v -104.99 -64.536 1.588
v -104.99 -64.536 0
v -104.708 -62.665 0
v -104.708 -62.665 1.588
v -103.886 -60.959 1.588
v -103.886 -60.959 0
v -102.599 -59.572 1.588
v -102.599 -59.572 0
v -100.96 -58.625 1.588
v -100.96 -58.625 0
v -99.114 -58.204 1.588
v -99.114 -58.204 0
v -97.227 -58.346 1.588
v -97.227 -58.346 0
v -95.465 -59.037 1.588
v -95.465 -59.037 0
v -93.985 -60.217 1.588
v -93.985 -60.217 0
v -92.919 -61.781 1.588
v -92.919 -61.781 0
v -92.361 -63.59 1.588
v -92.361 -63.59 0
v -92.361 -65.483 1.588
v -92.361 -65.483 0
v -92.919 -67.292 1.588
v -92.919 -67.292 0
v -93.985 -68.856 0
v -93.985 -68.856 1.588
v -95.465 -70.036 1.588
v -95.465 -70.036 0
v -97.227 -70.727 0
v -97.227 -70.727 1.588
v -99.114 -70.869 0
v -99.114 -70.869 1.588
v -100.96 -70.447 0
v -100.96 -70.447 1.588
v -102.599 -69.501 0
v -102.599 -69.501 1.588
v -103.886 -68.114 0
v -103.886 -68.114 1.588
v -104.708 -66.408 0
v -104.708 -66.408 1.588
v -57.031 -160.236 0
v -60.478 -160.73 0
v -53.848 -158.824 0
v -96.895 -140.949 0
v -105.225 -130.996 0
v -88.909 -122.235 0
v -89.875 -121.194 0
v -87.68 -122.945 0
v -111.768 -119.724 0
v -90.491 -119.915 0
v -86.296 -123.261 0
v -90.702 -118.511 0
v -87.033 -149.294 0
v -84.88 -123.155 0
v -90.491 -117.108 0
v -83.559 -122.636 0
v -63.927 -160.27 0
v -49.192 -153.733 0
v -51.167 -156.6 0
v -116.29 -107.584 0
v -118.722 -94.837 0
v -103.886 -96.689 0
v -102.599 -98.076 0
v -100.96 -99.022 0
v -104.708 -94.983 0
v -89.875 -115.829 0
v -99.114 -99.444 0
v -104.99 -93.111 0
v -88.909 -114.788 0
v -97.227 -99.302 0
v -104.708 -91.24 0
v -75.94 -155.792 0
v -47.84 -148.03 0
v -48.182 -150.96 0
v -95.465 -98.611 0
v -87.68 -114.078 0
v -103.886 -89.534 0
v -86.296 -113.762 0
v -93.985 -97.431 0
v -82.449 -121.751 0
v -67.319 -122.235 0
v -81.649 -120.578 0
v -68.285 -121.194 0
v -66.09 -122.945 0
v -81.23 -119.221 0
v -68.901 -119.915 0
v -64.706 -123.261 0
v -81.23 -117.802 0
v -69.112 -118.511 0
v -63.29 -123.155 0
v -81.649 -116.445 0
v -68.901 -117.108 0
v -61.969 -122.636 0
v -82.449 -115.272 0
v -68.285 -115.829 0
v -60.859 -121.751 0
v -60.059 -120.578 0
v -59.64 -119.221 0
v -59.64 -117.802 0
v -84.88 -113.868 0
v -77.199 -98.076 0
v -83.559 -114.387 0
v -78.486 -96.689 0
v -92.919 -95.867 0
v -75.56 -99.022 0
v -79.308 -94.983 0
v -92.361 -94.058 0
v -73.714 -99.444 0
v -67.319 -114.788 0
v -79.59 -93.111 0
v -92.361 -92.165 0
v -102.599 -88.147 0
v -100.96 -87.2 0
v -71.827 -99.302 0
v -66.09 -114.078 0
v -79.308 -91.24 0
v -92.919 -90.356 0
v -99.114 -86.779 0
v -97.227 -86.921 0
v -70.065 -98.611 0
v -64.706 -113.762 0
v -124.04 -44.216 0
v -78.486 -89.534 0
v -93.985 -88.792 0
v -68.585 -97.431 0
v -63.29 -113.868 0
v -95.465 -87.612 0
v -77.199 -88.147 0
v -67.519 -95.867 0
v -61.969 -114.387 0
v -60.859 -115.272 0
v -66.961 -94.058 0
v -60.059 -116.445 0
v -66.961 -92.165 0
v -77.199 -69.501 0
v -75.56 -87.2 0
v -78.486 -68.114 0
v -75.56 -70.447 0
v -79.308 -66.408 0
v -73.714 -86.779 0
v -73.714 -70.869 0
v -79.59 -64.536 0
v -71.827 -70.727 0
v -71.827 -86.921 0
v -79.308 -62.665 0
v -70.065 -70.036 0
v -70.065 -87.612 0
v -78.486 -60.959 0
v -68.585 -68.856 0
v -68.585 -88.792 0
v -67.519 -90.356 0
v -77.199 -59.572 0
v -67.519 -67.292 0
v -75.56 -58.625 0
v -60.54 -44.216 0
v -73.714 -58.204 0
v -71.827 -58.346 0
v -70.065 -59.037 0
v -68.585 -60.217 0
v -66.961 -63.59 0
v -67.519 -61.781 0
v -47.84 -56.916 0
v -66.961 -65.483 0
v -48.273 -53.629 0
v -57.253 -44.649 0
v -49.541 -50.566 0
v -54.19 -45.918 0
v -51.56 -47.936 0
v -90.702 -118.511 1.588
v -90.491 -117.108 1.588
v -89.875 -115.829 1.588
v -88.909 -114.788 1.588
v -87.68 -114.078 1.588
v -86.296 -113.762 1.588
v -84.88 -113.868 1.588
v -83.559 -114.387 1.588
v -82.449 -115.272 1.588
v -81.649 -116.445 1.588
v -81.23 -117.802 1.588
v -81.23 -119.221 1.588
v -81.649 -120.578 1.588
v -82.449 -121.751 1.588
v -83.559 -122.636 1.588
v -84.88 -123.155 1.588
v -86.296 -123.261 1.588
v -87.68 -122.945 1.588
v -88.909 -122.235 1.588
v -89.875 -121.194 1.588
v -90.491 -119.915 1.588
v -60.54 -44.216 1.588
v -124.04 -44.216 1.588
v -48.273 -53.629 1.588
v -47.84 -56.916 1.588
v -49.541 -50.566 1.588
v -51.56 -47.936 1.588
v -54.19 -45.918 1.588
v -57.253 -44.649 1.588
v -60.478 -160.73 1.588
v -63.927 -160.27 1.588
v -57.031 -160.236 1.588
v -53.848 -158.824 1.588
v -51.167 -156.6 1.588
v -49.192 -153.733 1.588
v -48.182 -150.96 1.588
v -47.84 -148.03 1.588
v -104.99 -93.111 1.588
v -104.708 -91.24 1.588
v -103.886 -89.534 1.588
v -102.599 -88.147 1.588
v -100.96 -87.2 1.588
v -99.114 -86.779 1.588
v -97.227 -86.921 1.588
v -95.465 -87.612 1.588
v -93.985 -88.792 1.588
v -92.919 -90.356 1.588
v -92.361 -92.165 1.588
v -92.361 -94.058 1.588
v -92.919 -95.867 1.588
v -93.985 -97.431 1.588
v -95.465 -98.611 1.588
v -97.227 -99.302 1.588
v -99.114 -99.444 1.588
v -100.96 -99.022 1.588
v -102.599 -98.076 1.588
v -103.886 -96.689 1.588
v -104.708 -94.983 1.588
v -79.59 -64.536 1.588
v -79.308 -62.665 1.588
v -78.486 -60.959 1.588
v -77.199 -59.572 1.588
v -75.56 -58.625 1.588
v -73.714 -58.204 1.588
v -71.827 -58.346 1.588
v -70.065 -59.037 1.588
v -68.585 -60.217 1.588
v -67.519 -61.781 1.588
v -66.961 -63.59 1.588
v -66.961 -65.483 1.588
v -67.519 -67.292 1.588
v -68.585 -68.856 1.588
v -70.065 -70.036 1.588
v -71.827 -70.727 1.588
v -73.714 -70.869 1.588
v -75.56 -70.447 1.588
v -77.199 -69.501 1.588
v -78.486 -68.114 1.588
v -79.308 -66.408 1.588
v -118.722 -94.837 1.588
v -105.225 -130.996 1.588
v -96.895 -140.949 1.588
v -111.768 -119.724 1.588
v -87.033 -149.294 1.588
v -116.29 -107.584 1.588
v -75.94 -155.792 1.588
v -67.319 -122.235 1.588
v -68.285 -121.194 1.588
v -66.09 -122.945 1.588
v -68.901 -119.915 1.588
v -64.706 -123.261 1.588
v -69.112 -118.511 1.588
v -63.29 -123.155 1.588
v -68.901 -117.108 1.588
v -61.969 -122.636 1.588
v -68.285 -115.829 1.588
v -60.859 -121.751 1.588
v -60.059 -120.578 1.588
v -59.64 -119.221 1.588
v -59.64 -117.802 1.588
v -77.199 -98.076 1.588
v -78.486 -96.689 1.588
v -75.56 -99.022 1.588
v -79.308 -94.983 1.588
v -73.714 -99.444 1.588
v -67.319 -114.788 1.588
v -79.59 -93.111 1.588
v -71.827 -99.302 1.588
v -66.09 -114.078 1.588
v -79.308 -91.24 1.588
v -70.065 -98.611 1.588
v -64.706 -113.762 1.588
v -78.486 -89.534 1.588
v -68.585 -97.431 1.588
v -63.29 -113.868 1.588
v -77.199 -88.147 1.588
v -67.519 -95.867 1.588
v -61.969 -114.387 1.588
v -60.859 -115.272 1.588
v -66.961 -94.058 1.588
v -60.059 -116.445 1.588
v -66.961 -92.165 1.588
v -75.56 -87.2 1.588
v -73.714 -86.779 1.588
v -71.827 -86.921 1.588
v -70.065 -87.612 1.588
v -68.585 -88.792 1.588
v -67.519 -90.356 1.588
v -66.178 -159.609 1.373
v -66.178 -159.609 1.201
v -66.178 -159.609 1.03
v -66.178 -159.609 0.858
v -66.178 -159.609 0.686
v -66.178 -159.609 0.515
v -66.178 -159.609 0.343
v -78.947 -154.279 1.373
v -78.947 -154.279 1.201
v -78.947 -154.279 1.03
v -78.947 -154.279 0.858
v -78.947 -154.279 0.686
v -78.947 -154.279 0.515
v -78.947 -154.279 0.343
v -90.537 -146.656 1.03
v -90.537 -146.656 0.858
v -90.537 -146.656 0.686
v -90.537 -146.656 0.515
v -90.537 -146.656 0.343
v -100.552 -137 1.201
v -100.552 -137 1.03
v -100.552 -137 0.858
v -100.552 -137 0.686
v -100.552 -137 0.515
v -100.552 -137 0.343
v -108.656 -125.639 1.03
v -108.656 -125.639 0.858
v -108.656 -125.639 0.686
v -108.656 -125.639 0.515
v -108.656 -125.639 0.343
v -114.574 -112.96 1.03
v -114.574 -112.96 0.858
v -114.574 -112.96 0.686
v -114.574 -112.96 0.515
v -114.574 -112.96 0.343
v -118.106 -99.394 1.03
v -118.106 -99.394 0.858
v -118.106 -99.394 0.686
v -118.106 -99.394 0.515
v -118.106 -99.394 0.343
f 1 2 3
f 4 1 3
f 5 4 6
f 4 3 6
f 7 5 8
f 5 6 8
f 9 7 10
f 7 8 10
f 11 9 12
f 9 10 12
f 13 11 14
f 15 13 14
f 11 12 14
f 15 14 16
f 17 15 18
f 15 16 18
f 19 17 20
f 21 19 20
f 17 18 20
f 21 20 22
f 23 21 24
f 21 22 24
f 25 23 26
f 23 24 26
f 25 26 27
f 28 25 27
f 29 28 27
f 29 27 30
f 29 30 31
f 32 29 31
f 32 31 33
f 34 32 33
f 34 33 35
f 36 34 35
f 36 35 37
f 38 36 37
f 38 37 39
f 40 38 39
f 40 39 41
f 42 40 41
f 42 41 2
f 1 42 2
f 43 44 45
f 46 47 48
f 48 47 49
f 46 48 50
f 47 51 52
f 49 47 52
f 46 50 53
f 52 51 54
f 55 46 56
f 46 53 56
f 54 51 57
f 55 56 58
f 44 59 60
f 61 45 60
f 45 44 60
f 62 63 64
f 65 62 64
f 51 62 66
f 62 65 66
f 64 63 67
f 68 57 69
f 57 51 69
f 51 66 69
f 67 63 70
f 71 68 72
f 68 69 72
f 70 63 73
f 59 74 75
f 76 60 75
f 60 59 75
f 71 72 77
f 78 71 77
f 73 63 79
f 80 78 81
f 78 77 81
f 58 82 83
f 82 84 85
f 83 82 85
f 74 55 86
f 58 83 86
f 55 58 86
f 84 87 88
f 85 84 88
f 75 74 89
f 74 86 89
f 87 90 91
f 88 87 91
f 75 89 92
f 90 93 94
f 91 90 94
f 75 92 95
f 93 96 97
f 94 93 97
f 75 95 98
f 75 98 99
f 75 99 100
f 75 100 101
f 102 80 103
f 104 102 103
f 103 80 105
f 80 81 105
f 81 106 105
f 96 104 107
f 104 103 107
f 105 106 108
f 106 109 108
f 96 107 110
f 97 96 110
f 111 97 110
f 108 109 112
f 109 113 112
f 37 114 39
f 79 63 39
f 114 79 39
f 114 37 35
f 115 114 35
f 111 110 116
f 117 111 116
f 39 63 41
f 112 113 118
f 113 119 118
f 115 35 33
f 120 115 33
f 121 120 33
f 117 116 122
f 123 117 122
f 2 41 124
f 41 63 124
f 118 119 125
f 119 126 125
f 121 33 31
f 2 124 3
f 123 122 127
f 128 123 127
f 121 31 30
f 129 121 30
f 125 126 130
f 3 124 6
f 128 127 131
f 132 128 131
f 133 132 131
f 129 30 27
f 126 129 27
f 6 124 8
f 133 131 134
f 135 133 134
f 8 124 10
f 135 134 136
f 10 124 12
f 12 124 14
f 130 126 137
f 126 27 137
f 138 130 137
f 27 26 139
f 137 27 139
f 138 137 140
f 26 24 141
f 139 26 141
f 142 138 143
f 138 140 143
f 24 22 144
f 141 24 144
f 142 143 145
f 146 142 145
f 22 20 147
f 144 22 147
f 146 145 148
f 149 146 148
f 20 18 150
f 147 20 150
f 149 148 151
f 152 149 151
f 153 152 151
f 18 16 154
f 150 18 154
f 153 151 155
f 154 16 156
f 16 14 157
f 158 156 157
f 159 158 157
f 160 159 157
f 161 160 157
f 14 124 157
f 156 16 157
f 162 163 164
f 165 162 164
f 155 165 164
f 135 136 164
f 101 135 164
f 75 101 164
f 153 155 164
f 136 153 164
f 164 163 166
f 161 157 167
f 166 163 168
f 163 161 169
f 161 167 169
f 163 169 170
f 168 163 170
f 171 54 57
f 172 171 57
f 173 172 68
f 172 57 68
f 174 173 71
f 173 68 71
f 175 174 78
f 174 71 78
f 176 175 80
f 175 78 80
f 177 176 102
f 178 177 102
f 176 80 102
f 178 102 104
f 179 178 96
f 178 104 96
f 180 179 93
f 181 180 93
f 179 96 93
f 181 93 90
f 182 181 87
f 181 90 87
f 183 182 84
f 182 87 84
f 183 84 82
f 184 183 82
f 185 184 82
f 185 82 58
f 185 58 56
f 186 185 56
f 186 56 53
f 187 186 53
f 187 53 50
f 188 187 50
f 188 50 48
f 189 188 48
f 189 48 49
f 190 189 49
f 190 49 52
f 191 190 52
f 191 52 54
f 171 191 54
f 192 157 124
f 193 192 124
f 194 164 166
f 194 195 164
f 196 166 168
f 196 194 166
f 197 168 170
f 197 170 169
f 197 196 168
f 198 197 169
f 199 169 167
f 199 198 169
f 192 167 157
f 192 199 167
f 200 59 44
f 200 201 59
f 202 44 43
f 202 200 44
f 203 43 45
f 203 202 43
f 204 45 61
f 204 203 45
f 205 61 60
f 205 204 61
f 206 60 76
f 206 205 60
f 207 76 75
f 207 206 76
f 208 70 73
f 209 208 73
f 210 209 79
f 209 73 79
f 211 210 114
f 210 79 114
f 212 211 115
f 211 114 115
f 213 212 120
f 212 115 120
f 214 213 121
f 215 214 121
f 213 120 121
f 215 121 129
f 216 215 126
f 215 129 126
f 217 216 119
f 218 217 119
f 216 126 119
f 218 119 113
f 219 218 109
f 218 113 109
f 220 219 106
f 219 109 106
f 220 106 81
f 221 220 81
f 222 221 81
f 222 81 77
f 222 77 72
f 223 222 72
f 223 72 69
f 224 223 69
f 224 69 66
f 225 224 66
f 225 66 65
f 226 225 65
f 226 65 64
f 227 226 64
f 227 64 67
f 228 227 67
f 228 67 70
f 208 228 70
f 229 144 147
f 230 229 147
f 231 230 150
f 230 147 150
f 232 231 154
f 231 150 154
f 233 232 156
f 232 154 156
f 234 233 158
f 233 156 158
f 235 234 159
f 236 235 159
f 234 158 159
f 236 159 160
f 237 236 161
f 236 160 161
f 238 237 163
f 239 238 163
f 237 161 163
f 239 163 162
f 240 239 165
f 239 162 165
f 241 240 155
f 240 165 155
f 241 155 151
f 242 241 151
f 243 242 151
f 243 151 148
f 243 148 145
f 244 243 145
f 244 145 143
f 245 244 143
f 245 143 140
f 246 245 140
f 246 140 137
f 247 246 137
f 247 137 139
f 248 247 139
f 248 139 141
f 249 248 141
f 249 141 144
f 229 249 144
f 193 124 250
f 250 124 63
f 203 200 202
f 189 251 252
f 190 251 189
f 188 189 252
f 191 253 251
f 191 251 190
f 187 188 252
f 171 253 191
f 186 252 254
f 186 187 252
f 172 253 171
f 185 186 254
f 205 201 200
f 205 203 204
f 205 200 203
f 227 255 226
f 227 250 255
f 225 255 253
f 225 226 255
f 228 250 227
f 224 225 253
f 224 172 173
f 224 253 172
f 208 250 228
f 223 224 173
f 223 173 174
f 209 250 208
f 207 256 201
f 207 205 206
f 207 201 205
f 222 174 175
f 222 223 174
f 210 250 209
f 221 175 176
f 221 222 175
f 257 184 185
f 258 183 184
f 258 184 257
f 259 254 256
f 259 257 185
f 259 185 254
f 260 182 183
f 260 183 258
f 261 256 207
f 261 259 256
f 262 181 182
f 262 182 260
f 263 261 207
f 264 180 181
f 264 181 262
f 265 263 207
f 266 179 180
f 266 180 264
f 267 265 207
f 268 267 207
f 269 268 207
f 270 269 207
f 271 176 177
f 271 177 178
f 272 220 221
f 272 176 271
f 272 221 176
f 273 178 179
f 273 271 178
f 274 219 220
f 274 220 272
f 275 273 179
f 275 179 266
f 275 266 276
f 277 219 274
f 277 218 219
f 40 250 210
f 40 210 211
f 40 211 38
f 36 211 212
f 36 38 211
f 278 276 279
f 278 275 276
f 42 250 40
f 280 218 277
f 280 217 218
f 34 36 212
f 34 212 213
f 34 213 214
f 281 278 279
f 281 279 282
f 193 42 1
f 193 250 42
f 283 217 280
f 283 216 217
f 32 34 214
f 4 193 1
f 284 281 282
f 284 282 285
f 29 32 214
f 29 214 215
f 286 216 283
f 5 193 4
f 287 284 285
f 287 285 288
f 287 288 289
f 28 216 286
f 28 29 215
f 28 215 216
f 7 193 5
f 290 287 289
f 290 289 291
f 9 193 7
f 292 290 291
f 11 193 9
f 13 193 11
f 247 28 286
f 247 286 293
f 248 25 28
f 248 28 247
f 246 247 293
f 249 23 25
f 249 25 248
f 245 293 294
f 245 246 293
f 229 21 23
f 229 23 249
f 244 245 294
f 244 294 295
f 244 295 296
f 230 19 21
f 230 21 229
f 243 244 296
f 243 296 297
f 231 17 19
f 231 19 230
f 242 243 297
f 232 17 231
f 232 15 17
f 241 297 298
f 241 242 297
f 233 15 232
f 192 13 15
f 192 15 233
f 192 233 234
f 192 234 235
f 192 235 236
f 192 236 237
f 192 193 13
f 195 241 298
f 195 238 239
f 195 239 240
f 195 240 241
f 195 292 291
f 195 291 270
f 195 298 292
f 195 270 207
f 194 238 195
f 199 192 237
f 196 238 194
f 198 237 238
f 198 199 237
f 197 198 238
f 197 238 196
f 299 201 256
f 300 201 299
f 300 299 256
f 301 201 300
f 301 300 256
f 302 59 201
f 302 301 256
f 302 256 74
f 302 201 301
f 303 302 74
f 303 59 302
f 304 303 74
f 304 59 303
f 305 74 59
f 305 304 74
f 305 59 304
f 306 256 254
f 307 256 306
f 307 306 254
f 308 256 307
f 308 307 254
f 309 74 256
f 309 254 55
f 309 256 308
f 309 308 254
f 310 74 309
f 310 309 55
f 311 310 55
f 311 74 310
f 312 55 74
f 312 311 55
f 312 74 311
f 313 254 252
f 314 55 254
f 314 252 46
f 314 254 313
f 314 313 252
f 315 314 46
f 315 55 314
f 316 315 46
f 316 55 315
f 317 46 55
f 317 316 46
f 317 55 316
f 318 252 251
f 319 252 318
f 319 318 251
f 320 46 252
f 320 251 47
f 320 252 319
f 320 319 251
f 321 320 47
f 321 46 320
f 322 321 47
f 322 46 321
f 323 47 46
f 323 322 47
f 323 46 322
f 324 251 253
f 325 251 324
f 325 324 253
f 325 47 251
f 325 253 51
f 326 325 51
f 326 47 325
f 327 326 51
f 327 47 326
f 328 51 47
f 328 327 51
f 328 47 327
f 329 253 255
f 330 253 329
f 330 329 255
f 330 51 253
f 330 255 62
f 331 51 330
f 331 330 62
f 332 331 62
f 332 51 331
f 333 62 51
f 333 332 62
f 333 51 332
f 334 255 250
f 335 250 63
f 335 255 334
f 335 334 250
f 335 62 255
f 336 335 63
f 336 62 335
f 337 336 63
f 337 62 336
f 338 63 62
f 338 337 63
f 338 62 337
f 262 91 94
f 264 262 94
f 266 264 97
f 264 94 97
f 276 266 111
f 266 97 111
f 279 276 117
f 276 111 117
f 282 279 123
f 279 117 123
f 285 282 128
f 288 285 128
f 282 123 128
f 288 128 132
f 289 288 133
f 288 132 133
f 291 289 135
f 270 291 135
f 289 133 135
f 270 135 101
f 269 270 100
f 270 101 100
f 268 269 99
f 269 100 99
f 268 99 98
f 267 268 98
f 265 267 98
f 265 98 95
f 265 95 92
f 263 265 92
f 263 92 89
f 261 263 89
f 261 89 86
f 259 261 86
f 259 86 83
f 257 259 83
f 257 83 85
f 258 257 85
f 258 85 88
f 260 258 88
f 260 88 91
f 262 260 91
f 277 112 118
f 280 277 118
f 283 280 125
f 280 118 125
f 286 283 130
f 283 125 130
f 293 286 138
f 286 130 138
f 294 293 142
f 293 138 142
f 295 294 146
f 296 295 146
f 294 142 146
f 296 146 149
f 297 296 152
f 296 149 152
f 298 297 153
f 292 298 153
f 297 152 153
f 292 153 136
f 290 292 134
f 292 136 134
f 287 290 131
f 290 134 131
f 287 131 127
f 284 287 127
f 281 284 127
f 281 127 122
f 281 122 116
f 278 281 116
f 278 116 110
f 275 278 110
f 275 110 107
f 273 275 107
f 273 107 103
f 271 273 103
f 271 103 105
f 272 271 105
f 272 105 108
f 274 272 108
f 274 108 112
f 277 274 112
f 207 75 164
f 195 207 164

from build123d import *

# Parameters (mm, degrees)
BOSS_EXTRUDE1_DEPTH = 1.5875
SKETCH2_R           = 4.7625
SKETCH2_R_2         = 6.35
CUT_EXTRUDE1_DEPTH  = 206.048954313
FILLET1_R           = 12.7


with BuildPart() as part:
    # Sketch1 → Boss-Extrude1 (new body)
    with BuildSketch(Plane.XY):
        with BuildLine():
            Line((-55.575312576, -162.067948142), (-47.839788583, -163.268748691))
            Line((-47.839788583, -163.268748691), (-47.839788583, -44.216449654))
            Line((-47.839788583, -44.216449654), (-124.039788583, -44.216449654))
            Line((-124.039788583, -44.216449654), (-118.722269766, -94.836839988))
            add(Edge.make_bspline(
                [(-55.575312576, -162.067948142), (-55.59376342, -162.065079619), (-55.650171893, -162.056309885), (-55.85836741, -162.023649386), (-56.351423804, -161.94437151), (-57.298183962, -161.782953677), (-59.601702252, -161.351219818), (-62.636225688, -160.651117849), (-66.258238647, -159.610029405), (-69.466373553, -158.528422888), (-72.693657497, -157.269325681), (-75.860283712, -155.860035916), (-78.959504505, -154.303585309), (-81.9847211, -152.603319472), (-84.929496882, -150.762889625), (-87.787571241, -148.786244312), (-90.552872427, -146.677620258), (-93.219530166, -144.441532812), (-95.781887647, -142.082765831), (-98.23451307, -139.606361101), (-100.572210643, -137.017607297), (-102.790031074, -134.322028508), (-104.883281533, -131.525372358), (-106.847535073, -128.633597727), (-108.67863952, -125.652862104), (-110.372725796, -122.589508584), (-111.926215689, -119.450052525), (-113.33582904, -116.24116789), (-114.598590351, -112.969673286), (-115.711834779, -109.642517734), (-116.673213527, -106.266766169), (-117.480698597, -102.849584725), (-118.13258691, -99.398225801), (-118.490033874, -96.886133888), (-118.655606827, -95.451511305), (-118.689766491, -95.14113961), (-118.706492882, -94.98591445), (-118.715898664, -94.897412794), (-118.721125626, -94.847717815), (-118.722269766, -94.836839988)],
                knots=[0, 0, 0, 0, 0.000570634, 0.001744558, 0.006440232, 0.015831442, 0.031091736, 0.078042667, 0.110904268, 0.146108785, 0.181308268, 0.216502219, 0.251690199, 0.286871835, 0.322046819, 0.357214911, 0.392375937, 0.427529794, 0.462676442, 0.497815906, 0.532948271, 0.568073682, 0.603192339, 0.638304491, 0.673410436, 0.708510515, 0.743605108, 0.77869463, 0.813779526, 0.84886027, 0.88393736, 0.919011312, 0.954082662, 0.989151956, 0.994996677, 0.997334555, 0.998503491, 0.999672426, 1, 1, 1, 1], degree=3))
        make_face()
    extrude(amount=BOSS_EXTRUDE1_DEPTH)

    # Sketch2 → Cut-Extrude1 (cut, through all)
    with BuildSketch(Plane(origin=(0, 0, 0), x_dir=(-1, 0, 0), z_dir=(0, 0, -1))):
        with Locations((64.349788583, -118.511449654)):
            Circle(SKETCH2_R)
        with Locations((85.939788583, -118.511449654)):
            Circle(SKETCH2_R)
        with Locations((73.239788583, -93.111449654)):
            Circle(SKETCH2_R_2)
        with Locations((98.639788583, -93.111449654)):
            Circle(SKETCH2_R_2)
        with Locations((98.639788583, -64.536449654)):
            Circle(SKETCH2_R_2)
        with Locations((73.239788583, -64.536449654)):
            Circle(SKETCH2_R_2)
    extrude(amount=-CUT_EXTRUDE1_DEPTH, mode=Mode.SUBTRACT)

    # Fillet1
    fillet1_edges = [part.edges().sort_by_distance(p)[0] for p in [
        (-47.839788583, -44.216449654, 0.79375),
        (-47.839788583, -163.268748691, 0.79375),
    ]]
    fillet(fillet1_edges, radius=FILLET1_R)


solid = part.part
